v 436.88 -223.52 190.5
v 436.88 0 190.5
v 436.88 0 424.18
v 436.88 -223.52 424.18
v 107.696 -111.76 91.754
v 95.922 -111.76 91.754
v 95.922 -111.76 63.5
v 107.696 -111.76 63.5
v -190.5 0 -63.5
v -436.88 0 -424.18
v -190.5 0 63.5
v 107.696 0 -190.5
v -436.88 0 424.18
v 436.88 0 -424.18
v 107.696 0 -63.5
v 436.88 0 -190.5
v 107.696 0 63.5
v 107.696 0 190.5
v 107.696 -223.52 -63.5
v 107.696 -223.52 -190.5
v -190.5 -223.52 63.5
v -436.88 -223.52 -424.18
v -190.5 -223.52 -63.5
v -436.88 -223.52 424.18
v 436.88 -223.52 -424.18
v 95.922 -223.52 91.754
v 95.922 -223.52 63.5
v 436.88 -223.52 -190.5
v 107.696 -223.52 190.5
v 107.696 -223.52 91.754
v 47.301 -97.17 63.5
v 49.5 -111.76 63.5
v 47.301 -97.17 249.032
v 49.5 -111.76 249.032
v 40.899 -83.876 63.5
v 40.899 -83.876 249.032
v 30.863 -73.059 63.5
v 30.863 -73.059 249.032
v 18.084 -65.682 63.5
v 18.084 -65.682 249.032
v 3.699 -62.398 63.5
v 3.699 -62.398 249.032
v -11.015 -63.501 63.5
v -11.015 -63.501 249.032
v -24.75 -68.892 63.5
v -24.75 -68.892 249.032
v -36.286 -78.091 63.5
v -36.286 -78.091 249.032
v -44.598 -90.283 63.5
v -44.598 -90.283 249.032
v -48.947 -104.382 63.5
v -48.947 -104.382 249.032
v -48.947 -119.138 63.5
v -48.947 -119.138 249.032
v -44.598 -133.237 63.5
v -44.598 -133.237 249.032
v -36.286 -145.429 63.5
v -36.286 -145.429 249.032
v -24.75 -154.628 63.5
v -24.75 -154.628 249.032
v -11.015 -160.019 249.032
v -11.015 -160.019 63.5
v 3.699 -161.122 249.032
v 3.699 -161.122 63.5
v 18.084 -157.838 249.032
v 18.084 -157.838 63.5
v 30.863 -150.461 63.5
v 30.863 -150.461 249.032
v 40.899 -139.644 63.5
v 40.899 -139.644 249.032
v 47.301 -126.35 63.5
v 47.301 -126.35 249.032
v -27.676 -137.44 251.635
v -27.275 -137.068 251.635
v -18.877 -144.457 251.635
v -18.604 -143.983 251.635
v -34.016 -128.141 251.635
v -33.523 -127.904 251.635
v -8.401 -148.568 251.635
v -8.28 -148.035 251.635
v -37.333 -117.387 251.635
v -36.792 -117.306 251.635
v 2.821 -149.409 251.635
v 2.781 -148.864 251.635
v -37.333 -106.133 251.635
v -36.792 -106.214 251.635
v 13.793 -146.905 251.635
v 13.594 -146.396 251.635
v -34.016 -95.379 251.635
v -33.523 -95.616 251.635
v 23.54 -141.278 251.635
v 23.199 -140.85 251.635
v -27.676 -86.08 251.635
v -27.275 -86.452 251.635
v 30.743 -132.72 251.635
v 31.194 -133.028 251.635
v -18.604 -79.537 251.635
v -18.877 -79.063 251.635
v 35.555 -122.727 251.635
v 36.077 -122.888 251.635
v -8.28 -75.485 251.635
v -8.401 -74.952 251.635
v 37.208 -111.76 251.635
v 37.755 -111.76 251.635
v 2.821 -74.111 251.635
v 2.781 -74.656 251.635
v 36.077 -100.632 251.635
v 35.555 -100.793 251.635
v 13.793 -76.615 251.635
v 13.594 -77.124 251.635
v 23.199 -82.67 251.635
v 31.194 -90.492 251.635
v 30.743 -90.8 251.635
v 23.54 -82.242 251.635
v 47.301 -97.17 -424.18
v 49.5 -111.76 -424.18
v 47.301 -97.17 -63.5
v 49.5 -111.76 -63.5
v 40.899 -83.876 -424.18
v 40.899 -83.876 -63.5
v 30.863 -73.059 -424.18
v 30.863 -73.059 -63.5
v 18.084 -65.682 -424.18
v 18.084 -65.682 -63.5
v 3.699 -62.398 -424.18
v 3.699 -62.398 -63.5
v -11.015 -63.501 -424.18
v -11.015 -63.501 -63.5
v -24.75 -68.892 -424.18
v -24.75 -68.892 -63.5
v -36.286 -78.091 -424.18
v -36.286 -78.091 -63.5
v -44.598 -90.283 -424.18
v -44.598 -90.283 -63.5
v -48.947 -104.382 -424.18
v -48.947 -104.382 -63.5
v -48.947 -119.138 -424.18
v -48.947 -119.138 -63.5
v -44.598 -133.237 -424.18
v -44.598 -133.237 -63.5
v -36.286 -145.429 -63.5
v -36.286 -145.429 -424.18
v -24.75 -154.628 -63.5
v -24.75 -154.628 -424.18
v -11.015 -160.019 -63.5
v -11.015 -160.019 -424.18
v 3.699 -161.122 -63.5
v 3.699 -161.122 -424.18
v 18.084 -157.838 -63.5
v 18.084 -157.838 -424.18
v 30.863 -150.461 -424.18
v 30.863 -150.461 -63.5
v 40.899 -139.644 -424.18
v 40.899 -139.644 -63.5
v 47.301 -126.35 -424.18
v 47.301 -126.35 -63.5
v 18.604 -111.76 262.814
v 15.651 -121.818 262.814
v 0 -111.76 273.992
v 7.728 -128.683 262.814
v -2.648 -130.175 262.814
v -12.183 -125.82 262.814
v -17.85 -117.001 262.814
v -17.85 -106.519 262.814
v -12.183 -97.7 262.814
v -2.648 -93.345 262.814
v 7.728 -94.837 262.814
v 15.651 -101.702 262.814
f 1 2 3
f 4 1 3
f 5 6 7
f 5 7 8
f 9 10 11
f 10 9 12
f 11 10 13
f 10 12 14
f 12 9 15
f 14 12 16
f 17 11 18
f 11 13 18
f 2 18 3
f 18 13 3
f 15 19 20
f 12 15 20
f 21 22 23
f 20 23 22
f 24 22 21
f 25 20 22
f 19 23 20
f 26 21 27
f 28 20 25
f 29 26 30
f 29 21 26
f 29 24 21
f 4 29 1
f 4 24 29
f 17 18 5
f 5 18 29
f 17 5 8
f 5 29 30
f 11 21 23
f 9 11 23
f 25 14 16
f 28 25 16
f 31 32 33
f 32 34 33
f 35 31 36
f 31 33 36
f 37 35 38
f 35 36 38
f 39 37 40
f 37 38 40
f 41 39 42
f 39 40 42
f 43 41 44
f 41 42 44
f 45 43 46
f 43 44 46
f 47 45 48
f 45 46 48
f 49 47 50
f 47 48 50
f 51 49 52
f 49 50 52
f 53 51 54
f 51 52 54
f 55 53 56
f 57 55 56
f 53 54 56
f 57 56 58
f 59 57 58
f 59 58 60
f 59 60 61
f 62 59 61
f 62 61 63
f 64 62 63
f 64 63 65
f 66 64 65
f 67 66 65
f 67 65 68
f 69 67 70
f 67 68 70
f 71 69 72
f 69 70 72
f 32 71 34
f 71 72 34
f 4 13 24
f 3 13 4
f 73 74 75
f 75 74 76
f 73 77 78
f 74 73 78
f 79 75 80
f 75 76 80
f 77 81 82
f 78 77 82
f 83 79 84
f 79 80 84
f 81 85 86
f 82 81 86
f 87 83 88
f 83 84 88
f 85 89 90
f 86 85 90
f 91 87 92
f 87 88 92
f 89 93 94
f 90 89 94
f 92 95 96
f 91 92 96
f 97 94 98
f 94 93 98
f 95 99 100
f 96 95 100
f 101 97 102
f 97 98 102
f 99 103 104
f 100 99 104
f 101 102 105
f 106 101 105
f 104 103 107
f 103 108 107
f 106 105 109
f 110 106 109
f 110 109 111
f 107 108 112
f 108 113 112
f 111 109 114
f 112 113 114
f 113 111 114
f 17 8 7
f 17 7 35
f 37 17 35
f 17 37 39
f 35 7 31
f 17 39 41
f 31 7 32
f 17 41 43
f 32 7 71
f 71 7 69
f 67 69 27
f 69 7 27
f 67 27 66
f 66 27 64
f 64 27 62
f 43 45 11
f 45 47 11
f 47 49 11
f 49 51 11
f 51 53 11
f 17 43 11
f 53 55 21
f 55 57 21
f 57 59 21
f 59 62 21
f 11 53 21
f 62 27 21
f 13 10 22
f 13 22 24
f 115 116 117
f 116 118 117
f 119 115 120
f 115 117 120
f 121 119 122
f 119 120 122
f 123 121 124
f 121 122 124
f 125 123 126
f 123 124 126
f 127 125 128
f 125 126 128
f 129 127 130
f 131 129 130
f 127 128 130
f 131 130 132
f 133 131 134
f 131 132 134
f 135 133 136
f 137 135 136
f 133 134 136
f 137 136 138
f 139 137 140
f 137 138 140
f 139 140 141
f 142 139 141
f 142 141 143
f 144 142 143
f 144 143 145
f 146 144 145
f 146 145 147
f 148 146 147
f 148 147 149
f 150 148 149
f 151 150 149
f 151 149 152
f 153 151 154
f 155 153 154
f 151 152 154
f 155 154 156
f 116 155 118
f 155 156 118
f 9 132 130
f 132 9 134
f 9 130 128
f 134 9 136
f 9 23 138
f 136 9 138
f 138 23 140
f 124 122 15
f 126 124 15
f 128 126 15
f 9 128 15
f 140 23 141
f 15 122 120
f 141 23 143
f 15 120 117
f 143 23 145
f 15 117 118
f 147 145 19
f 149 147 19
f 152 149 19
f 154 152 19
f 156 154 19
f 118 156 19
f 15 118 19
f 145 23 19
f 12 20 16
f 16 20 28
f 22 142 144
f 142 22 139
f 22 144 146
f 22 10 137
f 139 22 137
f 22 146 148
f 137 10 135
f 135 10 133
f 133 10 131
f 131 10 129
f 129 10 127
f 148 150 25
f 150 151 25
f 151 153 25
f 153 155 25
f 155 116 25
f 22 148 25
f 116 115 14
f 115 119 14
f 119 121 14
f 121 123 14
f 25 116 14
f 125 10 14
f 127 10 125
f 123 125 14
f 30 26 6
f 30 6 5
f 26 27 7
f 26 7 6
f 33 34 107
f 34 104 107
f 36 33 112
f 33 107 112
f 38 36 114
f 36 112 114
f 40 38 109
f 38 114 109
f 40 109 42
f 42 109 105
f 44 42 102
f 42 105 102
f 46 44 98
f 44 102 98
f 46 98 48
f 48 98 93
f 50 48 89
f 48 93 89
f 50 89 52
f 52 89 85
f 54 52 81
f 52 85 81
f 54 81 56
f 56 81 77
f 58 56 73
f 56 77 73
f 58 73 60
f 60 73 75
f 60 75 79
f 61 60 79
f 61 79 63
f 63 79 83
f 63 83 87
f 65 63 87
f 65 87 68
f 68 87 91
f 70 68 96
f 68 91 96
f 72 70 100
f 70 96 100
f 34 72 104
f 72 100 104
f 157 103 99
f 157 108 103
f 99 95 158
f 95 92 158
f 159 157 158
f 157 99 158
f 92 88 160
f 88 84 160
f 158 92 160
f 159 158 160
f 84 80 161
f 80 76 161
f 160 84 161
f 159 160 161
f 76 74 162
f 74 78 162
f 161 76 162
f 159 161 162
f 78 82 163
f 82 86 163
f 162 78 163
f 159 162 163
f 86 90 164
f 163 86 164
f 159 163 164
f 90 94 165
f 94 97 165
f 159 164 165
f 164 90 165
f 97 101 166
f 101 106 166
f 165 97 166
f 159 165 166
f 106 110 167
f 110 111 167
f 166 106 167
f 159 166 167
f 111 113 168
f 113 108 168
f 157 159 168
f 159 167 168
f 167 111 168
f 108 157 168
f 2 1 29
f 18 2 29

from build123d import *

# Parameters (mm, degrees)
F0_W     = 873.76
F0_H     = 848.36
F1_DEPTH = 223.52
F3_DEPTH = 254
F5_D     = 75
F5_DEPTH = 675.64
F5_TIP   = 22.5322732135
F7_W     = 22.5396603346
F7_H     = 45.0793132186
F8_DEPTH = 111.76


with BuildPart() as f1:
    # F0 (on Front) → F1 (new body)
    with BuildSketch(Plane.XZ):
        Rectangle(F0_W, F0_H)
    extrude(amount=F1_DEPTH)

    # F2 (on face) → F3 (cut)
    with BuildSketch(Plane.XZ.offset(223.52)):
        Polygon((107.696, 85.352614522), (107.696, 63.5), (-190.5, 63.5), (-190.5, 48.8914474845), (-190.5, 0), (-190.5, -48.8914474845), (-190.5, -63.5), (107.696, -63.5), (107.696, -85.352614522), (107.696, -181.2319755554), (107.696, -190.5), (716.4556980133, -190.5), (716.4556980133, 190.5), (430.53, 190.5), (107.696, 190.5), (107.696, 181.2319755554), align=None)
    extrude(amount=-F3_DEPTH, mode=Mode.SUBTRACT)

    # F5
    with Locations(Plane(origin=(0, 0, -424.18), x_dir=(1, 0, 0), z_dir=(0, 0, -1))):
        with Locations((0, 111.76)):
            Hole(F5_D / 2, depth=F5_DEPTH)
            with Locations((0, 0, -(F5_DEPTH + F5_TIP / 2))):  # 118° drill point
                Cone(0, F5_D / 2, F5_TIP, mode=Mode.SUBTRACT)

    # F7 (on face) → F8 (cut)
    with BuildSketch(Plane.XZ.offset(223.52)):
        with Locations((107.1918830276, 69.2144595087)):
            Rectangle(F7_W, F7_H)
    extrude(amount=-F8_DEPTH, mode=Mode.SUBTRACT)

    # F9 (on offset) → F10 (revolve, cut)
    with BuildSketch(Plane.XZ.offset(111.76)):
        Polygon((8.588981392, -428.1635656953), (49.5, -428.1635656953), (49.5, 249.0316255649), (37.7547182143, 251.635491848), (18.8773591071, 251.635491848), align=None)
    revolve(axis=Axis((0, -111.76, 257.2192468215), (0, 0, 1)), mode=Mode.SUBTRACT)


solid = f1.part
